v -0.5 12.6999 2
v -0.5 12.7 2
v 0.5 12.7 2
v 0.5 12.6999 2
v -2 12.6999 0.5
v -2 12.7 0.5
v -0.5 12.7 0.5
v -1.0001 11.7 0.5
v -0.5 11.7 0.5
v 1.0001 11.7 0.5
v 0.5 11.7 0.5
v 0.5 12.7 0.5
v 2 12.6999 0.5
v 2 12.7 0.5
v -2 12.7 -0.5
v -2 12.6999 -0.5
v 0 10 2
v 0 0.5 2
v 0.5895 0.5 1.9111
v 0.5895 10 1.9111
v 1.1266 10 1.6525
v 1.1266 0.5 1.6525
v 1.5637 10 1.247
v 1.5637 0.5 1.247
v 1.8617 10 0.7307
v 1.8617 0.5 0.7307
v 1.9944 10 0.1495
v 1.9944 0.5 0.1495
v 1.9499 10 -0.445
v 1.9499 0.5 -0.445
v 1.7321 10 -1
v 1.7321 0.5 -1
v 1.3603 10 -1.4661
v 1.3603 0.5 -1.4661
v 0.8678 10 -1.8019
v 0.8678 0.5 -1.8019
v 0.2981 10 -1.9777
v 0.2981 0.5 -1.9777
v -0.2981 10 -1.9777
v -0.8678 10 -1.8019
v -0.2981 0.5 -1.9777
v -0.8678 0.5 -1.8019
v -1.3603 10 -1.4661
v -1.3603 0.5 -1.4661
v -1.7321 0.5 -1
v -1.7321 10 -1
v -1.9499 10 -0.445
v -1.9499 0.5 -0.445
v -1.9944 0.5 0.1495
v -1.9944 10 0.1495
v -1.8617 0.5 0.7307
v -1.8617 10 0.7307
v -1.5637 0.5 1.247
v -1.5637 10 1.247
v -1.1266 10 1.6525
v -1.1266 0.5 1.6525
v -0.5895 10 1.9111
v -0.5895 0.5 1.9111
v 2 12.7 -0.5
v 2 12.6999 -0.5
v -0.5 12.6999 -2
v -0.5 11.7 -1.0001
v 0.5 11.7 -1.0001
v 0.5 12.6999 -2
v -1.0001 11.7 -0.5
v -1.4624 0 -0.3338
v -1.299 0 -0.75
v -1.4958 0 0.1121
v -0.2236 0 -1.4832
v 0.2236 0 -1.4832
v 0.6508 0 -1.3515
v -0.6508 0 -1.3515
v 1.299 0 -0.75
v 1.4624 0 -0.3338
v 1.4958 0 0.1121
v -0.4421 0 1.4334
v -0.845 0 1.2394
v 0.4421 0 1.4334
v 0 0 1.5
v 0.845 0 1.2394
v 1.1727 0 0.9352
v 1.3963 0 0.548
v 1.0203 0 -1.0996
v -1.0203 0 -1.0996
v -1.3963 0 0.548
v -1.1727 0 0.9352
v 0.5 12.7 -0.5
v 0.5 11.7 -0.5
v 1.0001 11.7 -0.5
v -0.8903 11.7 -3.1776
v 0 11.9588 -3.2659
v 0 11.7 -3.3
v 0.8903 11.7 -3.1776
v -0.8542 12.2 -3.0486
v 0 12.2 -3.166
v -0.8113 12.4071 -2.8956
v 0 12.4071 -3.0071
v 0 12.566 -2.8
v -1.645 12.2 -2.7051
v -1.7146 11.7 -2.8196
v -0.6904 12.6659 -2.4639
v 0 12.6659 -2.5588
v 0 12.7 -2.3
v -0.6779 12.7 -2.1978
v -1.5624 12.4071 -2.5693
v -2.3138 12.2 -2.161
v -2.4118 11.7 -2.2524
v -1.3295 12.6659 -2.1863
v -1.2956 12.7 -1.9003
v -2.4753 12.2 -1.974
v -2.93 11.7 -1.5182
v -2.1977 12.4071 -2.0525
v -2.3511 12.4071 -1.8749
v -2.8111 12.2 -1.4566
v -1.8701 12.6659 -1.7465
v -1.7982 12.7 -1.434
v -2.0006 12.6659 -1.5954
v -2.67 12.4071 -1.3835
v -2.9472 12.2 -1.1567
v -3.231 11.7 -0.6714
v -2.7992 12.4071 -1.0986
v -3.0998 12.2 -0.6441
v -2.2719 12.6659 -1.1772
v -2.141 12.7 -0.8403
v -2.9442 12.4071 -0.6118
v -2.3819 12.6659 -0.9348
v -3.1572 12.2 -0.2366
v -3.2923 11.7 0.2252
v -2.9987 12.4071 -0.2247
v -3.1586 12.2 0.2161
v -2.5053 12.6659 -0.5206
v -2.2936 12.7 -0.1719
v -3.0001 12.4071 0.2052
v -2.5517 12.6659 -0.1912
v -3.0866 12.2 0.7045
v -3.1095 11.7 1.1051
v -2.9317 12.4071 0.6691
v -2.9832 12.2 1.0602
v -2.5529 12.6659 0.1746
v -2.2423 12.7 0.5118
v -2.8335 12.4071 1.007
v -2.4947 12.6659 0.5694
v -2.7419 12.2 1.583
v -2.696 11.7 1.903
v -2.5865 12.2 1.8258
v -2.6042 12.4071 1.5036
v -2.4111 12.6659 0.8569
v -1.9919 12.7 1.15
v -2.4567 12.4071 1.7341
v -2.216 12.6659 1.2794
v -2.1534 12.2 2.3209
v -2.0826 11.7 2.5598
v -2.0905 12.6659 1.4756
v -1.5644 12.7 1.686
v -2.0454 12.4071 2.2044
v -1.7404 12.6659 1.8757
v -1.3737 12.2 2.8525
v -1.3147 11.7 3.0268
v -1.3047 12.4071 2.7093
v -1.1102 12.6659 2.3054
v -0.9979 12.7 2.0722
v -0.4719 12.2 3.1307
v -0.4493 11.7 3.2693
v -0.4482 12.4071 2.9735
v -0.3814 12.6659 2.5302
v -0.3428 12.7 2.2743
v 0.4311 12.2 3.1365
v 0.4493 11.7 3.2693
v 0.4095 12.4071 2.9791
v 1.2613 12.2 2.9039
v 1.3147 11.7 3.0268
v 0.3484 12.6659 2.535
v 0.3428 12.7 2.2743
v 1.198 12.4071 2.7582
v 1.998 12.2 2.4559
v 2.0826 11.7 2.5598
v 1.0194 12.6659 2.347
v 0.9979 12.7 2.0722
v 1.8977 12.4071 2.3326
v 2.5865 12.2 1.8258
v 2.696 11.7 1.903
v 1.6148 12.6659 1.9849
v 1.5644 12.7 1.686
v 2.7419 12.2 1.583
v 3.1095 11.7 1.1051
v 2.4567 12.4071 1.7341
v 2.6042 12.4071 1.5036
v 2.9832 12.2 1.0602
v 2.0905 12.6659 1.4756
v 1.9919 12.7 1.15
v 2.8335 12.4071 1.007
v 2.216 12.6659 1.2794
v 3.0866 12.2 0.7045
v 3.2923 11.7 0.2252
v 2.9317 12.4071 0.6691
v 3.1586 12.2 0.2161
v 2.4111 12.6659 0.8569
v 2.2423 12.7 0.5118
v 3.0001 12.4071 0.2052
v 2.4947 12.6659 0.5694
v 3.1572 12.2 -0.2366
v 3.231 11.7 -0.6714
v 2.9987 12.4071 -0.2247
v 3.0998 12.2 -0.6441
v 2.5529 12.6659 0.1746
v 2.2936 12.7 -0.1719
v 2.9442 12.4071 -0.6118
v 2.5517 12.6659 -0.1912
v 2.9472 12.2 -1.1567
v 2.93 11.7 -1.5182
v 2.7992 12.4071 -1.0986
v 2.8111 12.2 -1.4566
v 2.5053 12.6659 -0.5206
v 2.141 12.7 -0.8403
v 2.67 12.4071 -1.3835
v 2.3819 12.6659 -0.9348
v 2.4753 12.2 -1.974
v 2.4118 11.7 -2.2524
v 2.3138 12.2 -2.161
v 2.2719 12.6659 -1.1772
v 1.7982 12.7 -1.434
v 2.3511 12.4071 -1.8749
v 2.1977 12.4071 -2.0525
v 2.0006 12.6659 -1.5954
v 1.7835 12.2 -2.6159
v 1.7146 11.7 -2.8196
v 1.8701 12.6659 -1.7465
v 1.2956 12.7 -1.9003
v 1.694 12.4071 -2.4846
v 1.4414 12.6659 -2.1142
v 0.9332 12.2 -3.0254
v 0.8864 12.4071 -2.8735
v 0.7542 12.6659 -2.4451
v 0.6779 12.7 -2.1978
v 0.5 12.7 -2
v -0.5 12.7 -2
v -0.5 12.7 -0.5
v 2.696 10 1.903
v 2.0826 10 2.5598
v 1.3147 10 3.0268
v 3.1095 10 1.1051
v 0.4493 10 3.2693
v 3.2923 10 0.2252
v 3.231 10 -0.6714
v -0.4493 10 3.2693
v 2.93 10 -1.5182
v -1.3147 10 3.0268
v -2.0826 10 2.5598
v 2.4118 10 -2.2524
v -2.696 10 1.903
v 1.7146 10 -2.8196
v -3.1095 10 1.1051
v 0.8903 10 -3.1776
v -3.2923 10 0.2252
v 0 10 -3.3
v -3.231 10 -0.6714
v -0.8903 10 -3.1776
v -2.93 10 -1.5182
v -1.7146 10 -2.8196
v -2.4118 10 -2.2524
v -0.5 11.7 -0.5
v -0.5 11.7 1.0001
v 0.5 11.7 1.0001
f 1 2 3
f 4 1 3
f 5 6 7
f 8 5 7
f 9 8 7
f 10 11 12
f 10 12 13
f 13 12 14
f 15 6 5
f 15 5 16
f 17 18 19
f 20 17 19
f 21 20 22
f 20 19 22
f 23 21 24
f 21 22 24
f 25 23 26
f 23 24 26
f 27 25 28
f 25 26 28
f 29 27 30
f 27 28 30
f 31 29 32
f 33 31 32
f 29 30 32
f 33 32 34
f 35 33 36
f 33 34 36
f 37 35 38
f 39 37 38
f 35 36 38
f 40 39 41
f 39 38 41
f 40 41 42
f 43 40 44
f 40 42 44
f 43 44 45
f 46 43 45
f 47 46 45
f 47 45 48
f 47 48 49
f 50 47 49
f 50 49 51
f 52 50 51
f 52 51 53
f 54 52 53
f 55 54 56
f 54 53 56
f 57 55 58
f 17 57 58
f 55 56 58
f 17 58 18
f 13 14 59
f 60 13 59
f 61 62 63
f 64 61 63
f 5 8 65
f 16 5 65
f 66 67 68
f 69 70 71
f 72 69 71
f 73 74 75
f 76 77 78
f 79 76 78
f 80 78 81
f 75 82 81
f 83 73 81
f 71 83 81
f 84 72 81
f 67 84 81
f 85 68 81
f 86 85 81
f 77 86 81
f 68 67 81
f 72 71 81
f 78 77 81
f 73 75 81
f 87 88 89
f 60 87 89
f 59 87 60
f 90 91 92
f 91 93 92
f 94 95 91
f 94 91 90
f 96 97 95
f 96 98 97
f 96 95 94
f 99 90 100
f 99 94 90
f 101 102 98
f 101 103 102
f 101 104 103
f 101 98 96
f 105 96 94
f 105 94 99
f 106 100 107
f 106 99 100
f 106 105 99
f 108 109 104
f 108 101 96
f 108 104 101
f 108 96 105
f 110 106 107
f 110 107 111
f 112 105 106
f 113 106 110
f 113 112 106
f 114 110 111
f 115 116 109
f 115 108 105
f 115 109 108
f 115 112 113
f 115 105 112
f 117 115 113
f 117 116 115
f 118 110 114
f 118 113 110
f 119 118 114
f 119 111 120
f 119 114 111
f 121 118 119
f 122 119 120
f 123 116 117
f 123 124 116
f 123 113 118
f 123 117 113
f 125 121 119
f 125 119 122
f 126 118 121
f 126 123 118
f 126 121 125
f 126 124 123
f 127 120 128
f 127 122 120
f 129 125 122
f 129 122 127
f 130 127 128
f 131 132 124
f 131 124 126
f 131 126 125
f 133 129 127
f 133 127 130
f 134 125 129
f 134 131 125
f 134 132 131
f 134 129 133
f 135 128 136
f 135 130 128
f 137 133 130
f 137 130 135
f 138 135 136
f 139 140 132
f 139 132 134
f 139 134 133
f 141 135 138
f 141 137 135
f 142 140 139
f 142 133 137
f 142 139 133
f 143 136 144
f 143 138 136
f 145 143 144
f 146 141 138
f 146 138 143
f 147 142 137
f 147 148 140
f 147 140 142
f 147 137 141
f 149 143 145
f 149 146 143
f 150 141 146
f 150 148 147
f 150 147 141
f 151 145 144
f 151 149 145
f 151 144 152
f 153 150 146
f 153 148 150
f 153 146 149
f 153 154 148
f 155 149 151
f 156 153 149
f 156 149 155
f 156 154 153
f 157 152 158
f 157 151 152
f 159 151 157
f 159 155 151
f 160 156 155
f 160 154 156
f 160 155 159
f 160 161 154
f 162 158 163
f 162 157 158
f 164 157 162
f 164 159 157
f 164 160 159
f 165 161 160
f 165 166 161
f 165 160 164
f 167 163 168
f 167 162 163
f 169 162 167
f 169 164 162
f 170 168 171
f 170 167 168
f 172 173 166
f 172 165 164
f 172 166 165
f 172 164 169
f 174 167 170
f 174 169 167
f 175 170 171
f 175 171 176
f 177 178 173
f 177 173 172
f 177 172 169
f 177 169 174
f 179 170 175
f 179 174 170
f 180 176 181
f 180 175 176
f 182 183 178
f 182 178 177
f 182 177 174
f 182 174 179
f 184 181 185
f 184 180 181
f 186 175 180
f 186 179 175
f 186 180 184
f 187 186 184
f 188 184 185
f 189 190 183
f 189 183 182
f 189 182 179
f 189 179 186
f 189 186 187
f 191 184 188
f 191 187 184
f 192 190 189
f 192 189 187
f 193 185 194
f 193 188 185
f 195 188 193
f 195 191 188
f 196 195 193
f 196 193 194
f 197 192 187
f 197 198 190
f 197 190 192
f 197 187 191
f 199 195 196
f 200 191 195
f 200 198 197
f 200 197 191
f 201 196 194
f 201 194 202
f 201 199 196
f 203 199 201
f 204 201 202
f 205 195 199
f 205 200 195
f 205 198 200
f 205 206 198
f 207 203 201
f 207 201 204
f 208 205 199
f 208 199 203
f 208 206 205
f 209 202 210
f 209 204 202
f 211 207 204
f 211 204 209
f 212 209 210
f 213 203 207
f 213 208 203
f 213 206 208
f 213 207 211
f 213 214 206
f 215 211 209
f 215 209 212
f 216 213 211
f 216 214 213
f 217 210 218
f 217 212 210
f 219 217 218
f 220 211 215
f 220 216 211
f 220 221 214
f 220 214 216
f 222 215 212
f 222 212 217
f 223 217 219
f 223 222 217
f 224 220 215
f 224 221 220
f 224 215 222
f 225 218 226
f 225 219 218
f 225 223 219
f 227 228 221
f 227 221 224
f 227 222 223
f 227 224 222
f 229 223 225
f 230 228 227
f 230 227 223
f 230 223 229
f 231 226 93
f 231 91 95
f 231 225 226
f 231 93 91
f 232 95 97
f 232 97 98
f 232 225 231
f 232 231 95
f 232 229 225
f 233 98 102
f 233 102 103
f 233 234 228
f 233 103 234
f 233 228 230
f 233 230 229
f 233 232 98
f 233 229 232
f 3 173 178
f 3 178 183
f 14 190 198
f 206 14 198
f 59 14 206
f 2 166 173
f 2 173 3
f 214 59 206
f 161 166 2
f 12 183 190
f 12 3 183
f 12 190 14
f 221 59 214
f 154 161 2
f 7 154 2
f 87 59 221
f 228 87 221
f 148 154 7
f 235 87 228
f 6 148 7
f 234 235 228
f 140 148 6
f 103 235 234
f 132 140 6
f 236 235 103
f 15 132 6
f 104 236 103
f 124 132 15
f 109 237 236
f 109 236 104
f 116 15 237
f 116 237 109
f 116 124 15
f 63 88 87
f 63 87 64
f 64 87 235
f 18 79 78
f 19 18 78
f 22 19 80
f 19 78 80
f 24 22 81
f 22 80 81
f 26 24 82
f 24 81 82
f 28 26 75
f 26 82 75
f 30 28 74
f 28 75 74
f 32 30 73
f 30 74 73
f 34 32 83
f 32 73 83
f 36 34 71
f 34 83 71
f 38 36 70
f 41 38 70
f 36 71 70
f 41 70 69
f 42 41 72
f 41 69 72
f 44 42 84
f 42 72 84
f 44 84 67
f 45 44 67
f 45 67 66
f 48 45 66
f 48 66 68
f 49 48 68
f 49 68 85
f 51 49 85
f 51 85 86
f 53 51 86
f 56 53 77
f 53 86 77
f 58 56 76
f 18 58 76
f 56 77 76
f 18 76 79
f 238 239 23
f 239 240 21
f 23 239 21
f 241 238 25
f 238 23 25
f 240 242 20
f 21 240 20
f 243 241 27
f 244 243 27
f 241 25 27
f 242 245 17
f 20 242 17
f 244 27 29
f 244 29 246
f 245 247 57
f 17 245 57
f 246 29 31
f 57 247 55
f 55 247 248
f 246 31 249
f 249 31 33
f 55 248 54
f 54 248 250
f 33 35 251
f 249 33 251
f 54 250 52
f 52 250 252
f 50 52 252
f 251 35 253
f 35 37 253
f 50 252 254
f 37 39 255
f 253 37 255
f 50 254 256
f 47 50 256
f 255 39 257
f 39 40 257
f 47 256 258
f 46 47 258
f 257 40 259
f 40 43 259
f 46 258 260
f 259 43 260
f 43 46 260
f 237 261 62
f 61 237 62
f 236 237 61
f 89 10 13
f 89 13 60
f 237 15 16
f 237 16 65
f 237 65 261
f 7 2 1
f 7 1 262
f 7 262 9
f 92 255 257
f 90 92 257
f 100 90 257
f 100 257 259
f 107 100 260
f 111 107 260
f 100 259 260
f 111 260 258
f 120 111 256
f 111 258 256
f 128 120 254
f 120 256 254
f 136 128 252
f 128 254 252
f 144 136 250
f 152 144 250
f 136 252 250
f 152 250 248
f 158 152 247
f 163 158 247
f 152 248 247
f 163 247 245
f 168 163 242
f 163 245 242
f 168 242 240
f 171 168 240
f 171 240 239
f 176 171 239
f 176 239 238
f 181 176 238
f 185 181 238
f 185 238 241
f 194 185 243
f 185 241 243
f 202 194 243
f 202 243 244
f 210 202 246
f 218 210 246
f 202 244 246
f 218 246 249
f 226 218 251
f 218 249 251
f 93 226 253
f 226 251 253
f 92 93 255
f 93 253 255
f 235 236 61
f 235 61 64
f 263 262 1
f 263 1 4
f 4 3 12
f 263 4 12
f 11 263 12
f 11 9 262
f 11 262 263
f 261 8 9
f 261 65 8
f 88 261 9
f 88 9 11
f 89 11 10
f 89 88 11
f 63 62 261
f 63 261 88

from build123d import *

# Parameters (mm, degrees)
SKETCH_1_R          = 2
EXTRUDE_1_DEPTH     = 10
SKETCH_2_R          = 3.3
EXTRUDE_2_DEPTH     = 2.7
FILLET_1_R          = 1
CHAMFER_1_SIZE      = 0.5
SKETCH_3_W          = 4
SKETCH_3_H          = 1
SKETCH_3_W_2        = 1
SKETCH_3_H_2        = 4
CUT_EXTRUDE_1_DEPTH = 1
CHAMFER_2_SIZE      = 1


with BuildPart() as part:
    # 草图1 → 凸台-拉伸1 (new body)
    with BuildSketch(Plane(origin=(0, 0, 0), x_dir=(1, 0, 0), z_dir=(0, 1, 0))):
        with Locations(Location((0, 0, 0), (0, 0, 270))):
            Circle(SKETCH_1_R)
    extrude(amount=EXTRUDE_1_DEPTH)

    # 草图2 → 凸台-拉伸2 (add)
    with BuildSketch(Plane(origin=(0, 10, 0), x_dir=(1, 0, 0), z_dir=(0, 1, 0))):
        with Locations(Location((0, 0, 0), (0, 0, 90))):
            Circle(SKETCH_2_R)
    extrude(amount=EXTRUDE_2_DEPTH)

    # 圆角1
    fillet_1_edges = [part.edges().sort_by_distance(p)[0] for p in [
        (0, 12.7, 3.3),
    ]]
    fillet(fillet_1_edges, radius=FILLET_1_R)

    # 倒角1
    chamfer_1_edges = [part.edges().sort_by_distance(p)[0] for p in [
        (0, 0, -2),
    ]]
    chamfer(chamfer_1_edges, length=CHAMFER_1_SIZE)

    # 草图3 → 切除-拉伸-薄壁1 (cut)
    with BuildSketch(Plane(origin=(0, 12.7, 0), x_dir=(1, 0, 0), z_dir=(0, 1, 0))):
        Rectangle(SKETCH_3_W, SKETCH_3_H)
        Rectangle(SKETCH_3_W_2, SKETCH_3_H_2)
    extrude(amount=-CUT_EXTRUDE_1_DEPTH, mode=Mode.SUBTRACT)

    # 倒角2
    chamfer_2_edges = [part.edges().sort_by_distance(p)[0] for p in [
        (0, 11.7, 2),
        (2, 11.7, 0),
        (0, 11.7, -2),
        (-2, 11.7, 0),
    ]]
    chamfer(chamfer_2_edges, length=CHAMFER_2_SIZE - 0.0001)  # a hair under: the kernel refuses the full size


solid = part.part
